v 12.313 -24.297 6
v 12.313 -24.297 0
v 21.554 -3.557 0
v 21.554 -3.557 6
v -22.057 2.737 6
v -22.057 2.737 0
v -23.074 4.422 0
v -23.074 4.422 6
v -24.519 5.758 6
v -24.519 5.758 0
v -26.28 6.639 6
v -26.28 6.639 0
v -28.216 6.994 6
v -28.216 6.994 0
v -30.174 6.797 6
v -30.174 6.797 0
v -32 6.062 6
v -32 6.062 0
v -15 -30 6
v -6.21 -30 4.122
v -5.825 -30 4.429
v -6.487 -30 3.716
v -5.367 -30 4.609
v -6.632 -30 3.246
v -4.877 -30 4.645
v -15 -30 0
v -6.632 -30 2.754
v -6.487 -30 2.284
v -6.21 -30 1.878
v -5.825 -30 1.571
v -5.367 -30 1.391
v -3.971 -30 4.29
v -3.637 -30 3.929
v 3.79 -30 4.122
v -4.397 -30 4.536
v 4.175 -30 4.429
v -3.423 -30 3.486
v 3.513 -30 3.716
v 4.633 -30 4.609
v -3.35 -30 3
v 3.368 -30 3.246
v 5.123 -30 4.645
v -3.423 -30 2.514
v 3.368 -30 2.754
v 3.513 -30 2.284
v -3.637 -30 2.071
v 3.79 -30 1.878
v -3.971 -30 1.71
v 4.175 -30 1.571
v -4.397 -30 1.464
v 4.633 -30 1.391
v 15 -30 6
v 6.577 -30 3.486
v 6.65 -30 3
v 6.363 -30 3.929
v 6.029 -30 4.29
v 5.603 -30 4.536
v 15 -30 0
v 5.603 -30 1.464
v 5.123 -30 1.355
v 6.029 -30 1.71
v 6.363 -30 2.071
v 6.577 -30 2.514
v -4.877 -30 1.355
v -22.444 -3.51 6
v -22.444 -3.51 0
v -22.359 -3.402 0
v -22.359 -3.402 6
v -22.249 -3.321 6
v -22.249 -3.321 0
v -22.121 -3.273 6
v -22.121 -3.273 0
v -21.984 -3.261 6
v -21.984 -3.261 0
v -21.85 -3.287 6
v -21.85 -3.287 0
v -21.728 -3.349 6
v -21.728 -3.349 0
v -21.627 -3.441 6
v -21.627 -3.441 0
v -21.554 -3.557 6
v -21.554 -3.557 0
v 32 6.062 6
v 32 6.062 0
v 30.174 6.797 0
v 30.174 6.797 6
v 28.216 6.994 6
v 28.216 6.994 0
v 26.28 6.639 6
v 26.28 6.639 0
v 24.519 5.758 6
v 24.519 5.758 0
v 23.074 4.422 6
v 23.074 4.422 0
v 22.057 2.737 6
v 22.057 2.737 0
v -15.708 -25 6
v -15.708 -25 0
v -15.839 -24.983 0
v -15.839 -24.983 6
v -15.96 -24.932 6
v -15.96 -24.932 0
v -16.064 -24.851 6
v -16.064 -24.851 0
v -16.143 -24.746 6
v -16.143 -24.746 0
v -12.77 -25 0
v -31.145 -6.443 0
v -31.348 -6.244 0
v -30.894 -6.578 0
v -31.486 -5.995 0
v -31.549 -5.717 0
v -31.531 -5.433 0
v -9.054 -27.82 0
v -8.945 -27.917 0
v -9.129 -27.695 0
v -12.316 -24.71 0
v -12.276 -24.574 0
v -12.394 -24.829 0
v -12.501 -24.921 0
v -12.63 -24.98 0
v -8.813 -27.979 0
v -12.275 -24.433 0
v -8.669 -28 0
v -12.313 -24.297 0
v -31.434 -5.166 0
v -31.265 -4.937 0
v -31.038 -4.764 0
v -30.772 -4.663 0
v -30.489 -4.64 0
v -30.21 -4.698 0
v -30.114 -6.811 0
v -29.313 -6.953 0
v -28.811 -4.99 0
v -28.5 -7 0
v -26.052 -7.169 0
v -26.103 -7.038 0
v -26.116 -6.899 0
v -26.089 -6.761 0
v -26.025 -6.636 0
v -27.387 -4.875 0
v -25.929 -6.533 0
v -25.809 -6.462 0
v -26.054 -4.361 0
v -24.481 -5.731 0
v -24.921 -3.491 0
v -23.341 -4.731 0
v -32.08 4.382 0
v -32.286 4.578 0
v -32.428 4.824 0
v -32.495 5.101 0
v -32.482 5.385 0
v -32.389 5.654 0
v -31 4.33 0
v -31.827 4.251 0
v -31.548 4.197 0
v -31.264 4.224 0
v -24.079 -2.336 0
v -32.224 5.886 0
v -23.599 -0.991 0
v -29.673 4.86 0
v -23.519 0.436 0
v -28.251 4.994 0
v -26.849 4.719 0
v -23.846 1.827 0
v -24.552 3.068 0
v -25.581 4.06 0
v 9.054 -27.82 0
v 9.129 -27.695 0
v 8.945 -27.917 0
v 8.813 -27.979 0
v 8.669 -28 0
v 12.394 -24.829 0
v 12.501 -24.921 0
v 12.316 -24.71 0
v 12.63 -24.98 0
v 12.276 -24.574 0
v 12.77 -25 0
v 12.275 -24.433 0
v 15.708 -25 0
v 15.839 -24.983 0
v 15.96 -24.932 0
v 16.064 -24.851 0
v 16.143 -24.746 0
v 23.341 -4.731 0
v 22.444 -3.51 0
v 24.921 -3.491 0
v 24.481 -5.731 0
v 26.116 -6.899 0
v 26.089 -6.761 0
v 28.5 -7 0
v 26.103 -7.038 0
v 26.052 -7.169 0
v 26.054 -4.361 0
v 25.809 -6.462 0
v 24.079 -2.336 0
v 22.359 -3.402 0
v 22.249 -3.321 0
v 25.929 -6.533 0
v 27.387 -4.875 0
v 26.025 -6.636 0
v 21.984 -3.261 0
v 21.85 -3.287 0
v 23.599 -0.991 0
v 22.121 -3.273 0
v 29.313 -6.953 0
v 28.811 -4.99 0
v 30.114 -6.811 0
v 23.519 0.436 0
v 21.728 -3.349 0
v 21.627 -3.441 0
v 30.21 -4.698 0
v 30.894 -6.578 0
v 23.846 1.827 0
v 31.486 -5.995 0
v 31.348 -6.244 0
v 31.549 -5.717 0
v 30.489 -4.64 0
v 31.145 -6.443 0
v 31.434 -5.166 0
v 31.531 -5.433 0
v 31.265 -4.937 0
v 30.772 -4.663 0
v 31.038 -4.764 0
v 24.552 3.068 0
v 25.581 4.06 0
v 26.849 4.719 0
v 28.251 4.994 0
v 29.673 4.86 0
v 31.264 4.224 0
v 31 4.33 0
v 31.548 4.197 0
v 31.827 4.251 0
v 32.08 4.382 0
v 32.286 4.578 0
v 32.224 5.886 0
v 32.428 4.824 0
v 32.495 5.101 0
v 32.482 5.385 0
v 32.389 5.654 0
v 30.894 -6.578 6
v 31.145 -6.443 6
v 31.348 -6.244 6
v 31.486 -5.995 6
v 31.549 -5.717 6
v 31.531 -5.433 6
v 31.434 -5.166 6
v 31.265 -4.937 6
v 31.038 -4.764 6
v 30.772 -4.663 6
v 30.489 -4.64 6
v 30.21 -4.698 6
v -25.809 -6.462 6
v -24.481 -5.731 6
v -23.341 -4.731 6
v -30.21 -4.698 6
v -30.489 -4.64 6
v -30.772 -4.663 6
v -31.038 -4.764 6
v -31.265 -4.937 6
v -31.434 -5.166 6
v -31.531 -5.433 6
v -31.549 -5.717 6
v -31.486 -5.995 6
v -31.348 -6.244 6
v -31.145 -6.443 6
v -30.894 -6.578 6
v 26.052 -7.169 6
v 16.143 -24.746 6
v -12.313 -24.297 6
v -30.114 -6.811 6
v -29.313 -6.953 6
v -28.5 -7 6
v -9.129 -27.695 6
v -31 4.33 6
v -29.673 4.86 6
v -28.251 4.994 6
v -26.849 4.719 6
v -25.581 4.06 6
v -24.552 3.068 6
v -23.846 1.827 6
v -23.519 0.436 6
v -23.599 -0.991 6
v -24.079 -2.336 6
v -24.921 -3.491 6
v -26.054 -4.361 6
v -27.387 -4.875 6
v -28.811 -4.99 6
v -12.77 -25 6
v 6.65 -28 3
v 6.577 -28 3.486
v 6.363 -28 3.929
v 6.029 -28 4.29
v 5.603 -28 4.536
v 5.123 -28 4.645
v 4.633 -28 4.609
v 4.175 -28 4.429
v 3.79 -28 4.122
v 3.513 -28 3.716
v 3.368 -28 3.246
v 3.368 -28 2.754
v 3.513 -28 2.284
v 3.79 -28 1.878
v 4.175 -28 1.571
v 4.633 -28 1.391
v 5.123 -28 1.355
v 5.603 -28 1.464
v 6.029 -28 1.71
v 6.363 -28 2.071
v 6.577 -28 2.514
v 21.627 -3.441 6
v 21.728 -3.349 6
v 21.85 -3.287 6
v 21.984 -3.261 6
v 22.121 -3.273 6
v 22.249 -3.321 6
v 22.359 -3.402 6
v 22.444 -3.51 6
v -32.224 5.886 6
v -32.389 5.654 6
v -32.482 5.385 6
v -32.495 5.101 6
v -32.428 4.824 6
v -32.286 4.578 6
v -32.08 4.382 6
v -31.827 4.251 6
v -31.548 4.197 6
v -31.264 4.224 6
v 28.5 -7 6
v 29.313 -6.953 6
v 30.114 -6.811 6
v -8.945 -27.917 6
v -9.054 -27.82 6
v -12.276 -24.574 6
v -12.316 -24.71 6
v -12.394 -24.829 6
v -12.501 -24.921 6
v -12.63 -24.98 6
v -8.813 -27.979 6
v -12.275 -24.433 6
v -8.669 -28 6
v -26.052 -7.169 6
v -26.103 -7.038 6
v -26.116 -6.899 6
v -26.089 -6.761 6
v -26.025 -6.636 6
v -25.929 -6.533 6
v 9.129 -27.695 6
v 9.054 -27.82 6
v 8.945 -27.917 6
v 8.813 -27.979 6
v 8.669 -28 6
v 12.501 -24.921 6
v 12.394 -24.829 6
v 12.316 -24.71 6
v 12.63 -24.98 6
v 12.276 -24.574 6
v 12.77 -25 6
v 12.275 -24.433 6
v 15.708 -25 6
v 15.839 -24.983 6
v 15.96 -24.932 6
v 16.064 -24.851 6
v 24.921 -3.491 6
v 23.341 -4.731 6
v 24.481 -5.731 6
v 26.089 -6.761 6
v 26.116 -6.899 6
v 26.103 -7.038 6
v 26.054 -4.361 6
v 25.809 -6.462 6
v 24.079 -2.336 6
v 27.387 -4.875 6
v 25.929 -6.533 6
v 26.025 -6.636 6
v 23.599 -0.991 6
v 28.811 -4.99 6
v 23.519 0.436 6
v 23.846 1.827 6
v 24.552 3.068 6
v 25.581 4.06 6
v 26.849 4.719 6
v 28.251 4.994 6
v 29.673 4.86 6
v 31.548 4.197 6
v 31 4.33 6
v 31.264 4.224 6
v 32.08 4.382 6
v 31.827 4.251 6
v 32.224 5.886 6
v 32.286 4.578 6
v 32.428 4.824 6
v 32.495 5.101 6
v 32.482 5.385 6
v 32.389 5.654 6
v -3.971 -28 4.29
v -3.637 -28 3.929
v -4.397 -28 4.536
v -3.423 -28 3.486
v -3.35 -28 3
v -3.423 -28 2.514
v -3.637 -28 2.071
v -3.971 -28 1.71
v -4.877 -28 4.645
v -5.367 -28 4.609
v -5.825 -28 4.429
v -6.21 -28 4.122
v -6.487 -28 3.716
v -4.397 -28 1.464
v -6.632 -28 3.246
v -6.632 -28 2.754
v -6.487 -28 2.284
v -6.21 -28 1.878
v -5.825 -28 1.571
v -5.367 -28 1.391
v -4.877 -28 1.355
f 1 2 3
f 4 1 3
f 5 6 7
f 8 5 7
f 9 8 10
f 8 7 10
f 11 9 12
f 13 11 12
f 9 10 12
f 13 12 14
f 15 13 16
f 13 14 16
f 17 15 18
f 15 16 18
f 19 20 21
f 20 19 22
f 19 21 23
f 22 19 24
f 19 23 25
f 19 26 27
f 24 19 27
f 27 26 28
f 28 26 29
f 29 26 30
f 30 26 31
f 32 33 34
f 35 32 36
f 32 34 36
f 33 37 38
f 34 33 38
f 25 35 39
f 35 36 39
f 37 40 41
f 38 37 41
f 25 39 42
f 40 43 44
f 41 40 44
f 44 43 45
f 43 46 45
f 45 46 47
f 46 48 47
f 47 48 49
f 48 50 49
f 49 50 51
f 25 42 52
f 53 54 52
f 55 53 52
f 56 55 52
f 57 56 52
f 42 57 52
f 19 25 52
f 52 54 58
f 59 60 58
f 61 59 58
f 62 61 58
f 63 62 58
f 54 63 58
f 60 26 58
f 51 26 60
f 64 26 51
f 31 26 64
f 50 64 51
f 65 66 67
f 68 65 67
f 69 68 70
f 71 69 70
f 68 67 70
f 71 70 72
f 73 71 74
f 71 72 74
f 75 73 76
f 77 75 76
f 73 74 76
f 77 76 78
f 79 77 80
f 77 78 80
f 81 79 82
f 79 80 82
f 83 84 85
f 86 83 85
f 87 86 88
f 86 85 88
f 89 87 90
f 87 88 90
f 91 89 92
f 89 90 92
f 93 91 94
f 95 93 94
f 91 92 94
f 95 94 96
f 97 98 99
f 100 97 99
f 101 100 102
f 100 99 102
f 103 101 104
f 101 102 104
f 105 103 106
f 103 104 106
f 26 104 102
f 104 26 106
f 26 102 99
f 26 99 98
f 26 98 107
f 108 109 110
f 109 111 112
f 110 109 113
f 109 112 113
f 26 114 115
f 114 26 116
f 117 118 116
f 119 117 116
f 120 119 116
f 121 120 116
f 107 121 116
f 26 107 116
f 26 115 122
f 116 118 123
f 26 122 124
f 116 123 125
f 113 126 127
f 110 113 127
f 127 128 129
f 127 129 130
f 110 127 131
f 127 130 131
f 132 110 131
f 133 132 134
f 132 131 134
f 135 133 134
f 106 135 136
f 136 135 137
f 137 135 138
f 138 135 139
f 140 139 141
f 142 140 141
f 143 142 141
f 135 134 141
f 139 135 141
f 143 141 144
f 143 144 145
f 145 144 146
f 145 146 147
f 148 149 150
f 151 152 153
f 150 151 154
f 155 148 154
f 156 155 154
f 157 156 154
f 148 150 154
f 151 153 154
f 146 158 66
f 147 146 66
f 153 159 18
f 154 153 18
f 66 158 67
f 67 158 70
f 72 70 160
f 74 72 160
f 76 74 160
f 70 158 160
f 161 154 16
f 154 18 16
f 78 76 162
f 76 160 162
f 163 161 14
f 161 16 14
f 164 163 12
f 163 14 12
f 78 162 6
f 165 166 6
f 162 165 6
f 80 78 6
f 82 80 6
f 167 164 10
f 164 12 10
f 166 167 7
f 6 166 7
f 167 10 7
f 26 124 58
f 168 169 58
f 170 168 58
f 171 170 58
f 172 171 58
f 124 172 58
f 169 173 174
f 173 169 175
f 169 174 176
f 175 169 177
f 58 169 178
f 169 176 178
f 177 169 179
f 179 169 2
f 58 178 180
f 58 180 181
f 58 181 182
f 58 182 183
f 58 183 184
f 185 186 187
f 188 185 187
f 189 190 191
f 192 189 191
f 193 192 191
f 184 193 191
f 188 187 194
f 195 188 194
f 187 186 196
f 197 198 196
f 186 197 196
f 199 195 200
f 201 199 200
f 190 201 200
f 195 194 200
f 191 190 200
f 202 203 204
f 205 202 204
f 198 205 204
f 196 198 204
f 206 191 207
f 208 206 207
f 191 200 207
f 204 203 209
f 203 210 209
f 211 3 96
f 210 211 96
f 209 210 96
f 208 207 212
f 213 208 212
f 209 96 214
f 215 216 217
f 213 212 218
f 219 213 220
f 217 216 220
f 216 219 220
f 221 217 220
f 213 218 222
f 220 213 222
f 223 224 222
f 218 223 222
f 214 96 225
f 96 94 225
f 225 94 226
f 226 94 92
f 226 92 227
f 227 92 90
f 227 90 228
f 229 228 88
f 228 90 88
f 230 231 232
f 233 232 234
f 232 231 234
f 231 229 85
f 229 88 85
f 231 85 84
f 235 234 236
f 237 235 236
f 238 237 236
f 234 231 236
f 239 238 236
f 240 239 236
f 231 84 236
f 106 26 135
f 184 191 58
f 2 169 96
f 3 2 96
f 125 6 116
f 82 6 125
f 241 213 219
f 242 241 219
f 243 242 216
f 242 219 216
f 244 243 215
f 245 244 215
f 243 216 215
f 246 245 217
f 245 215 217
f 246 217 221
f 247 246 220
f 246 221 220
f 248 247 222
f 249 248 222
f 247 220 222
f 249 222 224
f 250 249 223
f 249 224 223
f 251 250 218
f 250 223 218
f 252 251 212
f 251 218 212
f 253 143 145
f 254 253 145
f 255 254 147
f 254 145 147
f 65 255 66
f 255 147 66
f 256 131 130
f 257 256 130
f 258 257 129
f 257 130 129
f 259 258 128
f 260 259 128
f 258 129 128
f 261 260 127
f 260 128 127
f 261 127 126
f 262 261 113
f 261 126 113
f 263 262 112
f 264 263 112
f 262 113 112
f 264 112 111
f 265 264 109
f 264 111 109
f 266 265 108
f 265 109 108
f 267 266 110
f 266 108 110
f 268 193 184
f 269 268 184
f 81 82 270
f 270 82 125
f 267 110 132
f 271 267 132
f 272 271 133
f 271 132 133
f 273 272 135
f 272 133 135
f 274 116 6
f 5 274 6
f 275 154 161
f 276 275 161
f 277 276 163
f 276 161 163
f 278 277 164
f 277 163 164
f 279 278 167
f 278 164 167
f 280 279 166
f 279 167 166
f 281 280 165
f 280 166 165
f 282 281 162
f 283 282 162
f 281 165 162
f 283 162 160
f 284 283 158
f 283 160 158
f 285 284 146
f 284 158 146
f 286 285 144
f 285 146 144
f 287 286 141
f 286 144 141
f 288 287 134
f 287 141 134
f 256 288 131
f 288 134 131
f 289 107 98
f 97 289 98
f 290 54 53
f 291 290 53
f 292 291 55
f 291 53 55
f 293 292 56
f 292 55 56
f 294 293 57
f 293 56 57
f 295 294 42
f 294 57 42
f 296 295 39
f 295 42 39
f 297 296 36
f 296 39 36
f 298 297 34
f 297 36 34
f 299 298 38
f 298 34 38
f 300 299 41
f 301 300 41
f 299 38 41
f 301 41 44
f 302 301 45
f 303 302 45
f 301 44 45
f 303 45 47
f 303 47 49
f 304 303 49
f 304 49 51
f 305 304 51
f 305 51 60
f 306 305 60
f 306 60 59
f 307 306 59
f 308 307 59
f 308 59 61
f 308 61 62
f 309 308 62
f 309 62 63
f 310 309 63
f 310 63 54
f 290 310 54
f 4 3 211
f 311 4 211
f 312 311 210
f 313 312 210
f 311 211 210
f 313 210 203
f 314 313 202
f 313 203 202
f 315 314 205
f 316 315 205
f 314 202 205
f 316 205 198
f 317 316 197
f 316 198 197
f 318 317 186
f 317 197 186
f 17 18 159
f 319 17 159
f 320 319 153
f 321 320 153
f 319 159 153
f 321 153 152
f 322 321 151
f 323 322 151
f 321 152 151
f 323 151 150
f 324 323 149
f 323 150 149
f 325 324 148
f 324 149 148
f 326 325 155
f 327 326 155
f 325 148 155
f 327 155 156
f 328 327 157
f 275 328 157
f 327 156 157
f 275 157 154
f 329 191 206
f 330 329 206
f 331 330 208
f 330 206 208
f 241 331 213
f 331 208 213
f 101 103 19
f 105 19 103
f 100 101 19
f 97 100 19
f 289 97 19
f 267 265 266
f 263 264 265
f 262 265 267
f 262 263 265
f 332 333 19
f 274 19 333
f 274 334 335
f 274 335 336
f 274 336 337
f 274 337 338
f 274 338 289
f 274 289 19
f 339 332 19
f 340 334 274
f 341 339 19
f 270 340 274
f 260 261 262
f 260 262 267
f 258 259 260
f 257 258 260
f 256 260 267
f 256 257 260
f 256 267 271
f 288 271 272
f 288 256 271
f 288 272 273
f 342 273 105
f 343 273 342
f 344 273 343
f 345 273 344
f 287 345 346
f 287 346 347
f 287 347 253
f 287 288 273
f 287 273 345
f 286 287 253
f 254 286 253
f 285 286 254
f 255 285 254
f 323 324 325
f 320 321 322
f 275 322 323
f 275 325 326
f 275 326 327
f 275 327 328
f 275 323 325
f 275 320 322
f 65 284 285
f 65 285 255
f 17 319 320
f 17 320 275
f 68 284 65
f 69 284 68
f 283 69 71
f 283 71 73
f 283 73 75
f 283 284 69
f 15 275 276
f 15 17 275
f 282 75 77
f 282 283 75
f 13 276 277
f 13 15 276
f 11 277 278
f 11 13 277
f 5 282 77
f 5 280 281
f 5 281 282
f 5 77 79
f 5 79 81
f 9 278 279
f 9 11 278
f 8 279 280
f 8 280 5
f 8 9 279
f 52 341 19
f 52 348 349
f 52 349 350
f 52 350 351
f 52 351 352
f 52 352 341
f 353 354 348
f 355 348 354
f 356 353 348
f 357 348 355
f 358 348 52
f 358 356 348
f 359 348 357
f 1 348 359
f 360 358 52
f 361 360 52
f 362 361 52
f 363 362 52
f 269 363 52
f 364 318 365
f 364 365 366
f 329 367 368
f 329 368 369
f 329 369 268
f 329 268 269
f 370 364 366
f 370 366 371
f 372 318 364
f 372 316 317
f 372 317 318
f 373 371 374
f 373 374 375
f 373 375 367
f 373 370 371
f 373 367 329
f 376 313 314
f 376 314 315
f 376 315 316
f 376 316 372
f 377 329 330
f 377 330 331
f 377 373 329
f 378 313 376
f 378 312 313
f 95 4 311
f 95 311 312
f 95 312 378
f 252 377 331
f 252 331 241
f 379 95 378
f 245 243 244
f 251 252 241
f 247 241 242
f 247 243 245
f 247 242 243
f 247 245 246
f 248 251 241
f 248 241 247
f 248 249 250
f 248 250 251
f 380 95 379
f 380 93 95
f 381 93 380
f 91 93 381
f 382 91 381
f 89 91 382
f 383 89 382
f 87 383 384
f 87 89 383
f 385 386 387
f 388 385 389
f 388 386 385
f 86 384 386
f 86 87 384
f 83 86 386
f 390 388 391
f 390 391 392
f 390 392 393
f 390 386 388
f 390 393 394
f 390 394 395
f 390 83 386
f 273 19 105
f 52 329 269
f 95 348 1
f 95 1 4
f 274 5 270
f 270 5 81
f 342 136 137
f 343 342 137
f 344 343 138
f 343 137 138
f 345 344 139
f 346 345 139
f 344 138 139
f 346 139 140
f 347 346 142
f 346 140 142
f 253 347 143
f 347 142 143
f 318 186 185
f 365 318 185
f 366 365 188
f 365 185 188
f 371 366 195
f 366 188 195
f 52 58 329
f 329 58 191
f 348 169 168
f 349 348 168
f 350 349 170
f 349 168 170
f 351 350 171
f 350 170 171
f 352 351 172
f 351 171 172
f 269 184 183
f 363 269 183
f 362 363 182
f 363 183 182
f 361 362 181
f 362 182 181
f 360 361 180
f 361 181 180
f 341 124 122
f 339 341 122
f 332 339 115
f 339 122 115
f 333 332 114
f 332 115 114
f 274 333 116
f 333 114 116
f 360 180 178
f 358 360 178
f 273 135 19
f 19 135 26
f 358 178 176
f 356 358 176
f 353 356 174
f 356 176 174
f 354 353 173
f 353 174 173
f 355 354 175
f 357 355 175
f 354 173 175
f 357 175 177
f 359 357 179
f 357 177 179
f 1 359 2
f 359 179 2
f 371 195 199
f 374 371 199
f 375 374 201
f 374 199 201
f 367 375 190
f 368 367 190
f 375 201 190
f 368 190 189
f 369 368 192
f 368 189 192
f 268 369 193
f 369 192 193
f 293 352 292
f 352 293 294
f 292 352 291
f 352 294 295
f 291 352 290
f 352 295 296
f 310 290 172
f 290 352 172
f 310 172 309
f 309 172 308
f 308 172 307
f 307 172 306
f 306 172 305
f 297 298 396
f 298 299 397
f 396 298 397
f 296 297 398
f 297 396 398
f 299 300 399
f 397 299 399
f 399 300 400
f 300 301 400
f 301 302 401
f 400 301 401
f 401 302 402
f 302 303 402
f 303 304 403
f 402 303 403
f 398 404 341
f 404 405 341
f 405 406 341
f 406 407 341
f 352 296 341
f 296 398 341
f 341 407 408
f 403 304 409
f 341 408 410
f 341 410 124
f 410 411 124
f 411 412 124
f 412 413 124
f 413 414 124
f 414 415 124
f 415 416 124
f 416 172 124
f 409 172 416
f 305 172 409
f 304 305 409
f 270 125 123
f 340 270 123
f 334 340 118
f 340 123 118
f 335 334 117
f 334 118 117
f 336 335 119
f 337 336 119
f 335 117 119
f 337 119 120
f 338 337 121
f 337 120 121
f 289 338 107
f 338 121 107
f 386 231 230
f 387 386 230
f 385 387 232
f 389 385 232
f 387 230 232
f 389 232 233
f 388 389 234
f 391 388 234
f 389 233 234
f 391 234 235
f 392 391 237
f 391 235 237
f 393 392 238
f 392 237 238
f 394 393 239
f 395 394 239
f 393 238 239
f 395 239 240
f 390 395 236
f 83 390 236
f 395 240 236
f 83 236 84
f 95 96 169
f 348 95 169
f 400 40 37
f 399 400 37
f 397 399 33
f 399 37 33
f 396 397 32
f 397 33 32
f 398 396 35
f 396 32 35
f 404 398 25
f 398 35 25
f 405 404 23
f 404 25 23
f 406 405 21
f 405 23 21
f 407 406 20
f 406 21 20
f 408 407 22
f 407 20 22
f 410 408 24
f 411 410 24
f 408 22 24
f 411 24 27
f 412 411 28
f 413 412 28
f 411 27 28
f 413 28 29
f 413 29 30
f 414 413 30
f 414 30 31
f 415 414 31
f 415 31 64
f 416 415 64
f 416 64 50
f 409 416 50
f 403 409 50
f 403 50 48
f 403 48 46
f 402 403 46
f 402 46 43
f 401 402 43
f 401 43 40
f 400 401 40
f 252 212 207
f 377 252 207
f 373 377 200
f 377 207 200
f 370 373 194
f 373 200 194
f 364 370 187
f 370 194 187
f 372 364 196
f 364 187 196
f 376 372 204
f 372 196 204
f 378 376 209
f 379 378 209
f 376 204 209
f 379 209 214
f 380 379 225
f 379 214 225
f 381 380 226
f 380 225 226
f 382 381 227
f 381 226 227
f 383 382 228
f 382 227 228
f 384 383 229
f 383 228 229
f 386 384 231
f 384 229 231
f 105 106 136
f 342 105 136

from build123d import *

# Parameters (mm, degrees)
F1_DEPTH = 6
F2_R     = 1.65
F3_DEPTH = 25


with BuildPart() as f1:
    # F0 (on Top) → F1 (new body)
    with BuildSketch(Plane.XY):
        with BuildLine():
            ThreePointArc((-32, 6.062178), (-32.366025, 4.696152), (-31, 4.330127))
            ThreePointArc((-31, 4.330127), (-23.519027, 0.435779), (-30.210101, -4.698463))
            ThreePointArc((-30.210101, -4.698463), (-31.491813, -5.296136), (-30.894141, -6.577848))
            ThreePointArc((-30.894141, -6.577848), (-29.715537, -6.893654), (-28.5, -7))
            Line((-28.5, -7), (-15, -30))
            Line((-15, -30), (0, -30))
            Line((0, -30), (15, -30))
            Line((15, -30), (28.5, -7))
            ThreePointArc((28.5, -7), (29.715537, -6.893654), (30.894141, -6.577848))
            ThreePointArc((30.894141, -6.577848), (31.491813, -5.296136), (30.210101, -4.698463))
            ThreePointArc((30.210101, -4.698463), (23.519027, 0.435779), (31, 4.330127))
            ThreePointArc((31, 4.330127), (32.366025, 4.696152), (32, 6.062178))
            ThreePointArc((32, 6.062178), (26.279799, 6.638577), (22.057234, 2.736926))
            Line((22.057234, 2.736926), (9.129356, -27.695495))
            ThreePointArc((9.129356, -27.695495), (8.945068, -27.916982), (8.669158, -28))
            Line((8.669158, -28), (0, -28))
            Line((0, -28), (-8.669158, -28))
            ThreePointArc((-8.669158, -28), (-8.945068, -27.916982), (-9.129356, -27.695495))
            Line((-9.129356, -27.695495), (-22.057234, 2.736926))
            ThreePointArc((-22.057234, 2.736926), (-26.279799, 6.638577), (-32, 6.062178))
        make_face()
        with BuildLine():
            Line((-16.143448, -24.745536), (-26.051811, -7.168974))
            ThreePointArc((-26.051811, -7.168974), (-26.089044, -6.760752), (-25.808501, -6.461875))
            ThreePointArc((-25.808501, -6.461875), (-23.883692, -5.262101), (-22.443534, -3.509875))
            ThreePointArc((-22.443534, -3.509875), (-21.984425, -3.261283), (-21.554214, -3.557084))
            Line((-21.554214, -3.557084), (-12.313453, -24.296503))
            ThreePointArc((-12.313453, -24.296503), (-12.350796, -24.772261), (-12.770169, -25))
            Line((-12.770169, -25), (-15.707888, -25))
            ThreePointArc((-15.707888, -25), (-15.960111, -24.931722), (-16.143448, -24.745536))
        make_face(mode=Mode.SUBTRACT)
        with BuildLine():
            ThreePointArc((21.554214, -3.557084), (21.984425, -3.261283), (22.443534, -3.509875))
            ThreePointArc((22.443534, -3.509875), (23.883692, -5.262101), (25.808501, -6.461875))
            ThreePointArc((25.808501, -6.461875), (26.089044, -6.760752), (26.051811, -7.168974))
            Line((26.051811, -7.168974), (16.143448, -24.745536))
            ThreePointArc((16.143448, -24.745536), (15.960111, -24.931722), (15.707888, -25))
            Line((15.707888, -25), (12.770169, -25))
            ThreePointArc((12.770169, -25), (12.350796, -24.772261), (12.313453, -24.296503))
            Line((12.313453, -24.296503), (21.554214, -3.557084))
        make_face(mode=Mode.SUBTRACT)
    extrude(amount=F1_DEPTH)

    # F2 (on face) → F3 (cut)
    with BuildSketch(Plane.XZ.offset(30)):
        with Locations((-5, 3)):
            Circle(F2_R)
        with Locations((5, 3)):
            Circle(F2_R)
    extrude(amount=-F3_DEPTH, mode=Mode.SUBTRACT)


solid = f1.part
